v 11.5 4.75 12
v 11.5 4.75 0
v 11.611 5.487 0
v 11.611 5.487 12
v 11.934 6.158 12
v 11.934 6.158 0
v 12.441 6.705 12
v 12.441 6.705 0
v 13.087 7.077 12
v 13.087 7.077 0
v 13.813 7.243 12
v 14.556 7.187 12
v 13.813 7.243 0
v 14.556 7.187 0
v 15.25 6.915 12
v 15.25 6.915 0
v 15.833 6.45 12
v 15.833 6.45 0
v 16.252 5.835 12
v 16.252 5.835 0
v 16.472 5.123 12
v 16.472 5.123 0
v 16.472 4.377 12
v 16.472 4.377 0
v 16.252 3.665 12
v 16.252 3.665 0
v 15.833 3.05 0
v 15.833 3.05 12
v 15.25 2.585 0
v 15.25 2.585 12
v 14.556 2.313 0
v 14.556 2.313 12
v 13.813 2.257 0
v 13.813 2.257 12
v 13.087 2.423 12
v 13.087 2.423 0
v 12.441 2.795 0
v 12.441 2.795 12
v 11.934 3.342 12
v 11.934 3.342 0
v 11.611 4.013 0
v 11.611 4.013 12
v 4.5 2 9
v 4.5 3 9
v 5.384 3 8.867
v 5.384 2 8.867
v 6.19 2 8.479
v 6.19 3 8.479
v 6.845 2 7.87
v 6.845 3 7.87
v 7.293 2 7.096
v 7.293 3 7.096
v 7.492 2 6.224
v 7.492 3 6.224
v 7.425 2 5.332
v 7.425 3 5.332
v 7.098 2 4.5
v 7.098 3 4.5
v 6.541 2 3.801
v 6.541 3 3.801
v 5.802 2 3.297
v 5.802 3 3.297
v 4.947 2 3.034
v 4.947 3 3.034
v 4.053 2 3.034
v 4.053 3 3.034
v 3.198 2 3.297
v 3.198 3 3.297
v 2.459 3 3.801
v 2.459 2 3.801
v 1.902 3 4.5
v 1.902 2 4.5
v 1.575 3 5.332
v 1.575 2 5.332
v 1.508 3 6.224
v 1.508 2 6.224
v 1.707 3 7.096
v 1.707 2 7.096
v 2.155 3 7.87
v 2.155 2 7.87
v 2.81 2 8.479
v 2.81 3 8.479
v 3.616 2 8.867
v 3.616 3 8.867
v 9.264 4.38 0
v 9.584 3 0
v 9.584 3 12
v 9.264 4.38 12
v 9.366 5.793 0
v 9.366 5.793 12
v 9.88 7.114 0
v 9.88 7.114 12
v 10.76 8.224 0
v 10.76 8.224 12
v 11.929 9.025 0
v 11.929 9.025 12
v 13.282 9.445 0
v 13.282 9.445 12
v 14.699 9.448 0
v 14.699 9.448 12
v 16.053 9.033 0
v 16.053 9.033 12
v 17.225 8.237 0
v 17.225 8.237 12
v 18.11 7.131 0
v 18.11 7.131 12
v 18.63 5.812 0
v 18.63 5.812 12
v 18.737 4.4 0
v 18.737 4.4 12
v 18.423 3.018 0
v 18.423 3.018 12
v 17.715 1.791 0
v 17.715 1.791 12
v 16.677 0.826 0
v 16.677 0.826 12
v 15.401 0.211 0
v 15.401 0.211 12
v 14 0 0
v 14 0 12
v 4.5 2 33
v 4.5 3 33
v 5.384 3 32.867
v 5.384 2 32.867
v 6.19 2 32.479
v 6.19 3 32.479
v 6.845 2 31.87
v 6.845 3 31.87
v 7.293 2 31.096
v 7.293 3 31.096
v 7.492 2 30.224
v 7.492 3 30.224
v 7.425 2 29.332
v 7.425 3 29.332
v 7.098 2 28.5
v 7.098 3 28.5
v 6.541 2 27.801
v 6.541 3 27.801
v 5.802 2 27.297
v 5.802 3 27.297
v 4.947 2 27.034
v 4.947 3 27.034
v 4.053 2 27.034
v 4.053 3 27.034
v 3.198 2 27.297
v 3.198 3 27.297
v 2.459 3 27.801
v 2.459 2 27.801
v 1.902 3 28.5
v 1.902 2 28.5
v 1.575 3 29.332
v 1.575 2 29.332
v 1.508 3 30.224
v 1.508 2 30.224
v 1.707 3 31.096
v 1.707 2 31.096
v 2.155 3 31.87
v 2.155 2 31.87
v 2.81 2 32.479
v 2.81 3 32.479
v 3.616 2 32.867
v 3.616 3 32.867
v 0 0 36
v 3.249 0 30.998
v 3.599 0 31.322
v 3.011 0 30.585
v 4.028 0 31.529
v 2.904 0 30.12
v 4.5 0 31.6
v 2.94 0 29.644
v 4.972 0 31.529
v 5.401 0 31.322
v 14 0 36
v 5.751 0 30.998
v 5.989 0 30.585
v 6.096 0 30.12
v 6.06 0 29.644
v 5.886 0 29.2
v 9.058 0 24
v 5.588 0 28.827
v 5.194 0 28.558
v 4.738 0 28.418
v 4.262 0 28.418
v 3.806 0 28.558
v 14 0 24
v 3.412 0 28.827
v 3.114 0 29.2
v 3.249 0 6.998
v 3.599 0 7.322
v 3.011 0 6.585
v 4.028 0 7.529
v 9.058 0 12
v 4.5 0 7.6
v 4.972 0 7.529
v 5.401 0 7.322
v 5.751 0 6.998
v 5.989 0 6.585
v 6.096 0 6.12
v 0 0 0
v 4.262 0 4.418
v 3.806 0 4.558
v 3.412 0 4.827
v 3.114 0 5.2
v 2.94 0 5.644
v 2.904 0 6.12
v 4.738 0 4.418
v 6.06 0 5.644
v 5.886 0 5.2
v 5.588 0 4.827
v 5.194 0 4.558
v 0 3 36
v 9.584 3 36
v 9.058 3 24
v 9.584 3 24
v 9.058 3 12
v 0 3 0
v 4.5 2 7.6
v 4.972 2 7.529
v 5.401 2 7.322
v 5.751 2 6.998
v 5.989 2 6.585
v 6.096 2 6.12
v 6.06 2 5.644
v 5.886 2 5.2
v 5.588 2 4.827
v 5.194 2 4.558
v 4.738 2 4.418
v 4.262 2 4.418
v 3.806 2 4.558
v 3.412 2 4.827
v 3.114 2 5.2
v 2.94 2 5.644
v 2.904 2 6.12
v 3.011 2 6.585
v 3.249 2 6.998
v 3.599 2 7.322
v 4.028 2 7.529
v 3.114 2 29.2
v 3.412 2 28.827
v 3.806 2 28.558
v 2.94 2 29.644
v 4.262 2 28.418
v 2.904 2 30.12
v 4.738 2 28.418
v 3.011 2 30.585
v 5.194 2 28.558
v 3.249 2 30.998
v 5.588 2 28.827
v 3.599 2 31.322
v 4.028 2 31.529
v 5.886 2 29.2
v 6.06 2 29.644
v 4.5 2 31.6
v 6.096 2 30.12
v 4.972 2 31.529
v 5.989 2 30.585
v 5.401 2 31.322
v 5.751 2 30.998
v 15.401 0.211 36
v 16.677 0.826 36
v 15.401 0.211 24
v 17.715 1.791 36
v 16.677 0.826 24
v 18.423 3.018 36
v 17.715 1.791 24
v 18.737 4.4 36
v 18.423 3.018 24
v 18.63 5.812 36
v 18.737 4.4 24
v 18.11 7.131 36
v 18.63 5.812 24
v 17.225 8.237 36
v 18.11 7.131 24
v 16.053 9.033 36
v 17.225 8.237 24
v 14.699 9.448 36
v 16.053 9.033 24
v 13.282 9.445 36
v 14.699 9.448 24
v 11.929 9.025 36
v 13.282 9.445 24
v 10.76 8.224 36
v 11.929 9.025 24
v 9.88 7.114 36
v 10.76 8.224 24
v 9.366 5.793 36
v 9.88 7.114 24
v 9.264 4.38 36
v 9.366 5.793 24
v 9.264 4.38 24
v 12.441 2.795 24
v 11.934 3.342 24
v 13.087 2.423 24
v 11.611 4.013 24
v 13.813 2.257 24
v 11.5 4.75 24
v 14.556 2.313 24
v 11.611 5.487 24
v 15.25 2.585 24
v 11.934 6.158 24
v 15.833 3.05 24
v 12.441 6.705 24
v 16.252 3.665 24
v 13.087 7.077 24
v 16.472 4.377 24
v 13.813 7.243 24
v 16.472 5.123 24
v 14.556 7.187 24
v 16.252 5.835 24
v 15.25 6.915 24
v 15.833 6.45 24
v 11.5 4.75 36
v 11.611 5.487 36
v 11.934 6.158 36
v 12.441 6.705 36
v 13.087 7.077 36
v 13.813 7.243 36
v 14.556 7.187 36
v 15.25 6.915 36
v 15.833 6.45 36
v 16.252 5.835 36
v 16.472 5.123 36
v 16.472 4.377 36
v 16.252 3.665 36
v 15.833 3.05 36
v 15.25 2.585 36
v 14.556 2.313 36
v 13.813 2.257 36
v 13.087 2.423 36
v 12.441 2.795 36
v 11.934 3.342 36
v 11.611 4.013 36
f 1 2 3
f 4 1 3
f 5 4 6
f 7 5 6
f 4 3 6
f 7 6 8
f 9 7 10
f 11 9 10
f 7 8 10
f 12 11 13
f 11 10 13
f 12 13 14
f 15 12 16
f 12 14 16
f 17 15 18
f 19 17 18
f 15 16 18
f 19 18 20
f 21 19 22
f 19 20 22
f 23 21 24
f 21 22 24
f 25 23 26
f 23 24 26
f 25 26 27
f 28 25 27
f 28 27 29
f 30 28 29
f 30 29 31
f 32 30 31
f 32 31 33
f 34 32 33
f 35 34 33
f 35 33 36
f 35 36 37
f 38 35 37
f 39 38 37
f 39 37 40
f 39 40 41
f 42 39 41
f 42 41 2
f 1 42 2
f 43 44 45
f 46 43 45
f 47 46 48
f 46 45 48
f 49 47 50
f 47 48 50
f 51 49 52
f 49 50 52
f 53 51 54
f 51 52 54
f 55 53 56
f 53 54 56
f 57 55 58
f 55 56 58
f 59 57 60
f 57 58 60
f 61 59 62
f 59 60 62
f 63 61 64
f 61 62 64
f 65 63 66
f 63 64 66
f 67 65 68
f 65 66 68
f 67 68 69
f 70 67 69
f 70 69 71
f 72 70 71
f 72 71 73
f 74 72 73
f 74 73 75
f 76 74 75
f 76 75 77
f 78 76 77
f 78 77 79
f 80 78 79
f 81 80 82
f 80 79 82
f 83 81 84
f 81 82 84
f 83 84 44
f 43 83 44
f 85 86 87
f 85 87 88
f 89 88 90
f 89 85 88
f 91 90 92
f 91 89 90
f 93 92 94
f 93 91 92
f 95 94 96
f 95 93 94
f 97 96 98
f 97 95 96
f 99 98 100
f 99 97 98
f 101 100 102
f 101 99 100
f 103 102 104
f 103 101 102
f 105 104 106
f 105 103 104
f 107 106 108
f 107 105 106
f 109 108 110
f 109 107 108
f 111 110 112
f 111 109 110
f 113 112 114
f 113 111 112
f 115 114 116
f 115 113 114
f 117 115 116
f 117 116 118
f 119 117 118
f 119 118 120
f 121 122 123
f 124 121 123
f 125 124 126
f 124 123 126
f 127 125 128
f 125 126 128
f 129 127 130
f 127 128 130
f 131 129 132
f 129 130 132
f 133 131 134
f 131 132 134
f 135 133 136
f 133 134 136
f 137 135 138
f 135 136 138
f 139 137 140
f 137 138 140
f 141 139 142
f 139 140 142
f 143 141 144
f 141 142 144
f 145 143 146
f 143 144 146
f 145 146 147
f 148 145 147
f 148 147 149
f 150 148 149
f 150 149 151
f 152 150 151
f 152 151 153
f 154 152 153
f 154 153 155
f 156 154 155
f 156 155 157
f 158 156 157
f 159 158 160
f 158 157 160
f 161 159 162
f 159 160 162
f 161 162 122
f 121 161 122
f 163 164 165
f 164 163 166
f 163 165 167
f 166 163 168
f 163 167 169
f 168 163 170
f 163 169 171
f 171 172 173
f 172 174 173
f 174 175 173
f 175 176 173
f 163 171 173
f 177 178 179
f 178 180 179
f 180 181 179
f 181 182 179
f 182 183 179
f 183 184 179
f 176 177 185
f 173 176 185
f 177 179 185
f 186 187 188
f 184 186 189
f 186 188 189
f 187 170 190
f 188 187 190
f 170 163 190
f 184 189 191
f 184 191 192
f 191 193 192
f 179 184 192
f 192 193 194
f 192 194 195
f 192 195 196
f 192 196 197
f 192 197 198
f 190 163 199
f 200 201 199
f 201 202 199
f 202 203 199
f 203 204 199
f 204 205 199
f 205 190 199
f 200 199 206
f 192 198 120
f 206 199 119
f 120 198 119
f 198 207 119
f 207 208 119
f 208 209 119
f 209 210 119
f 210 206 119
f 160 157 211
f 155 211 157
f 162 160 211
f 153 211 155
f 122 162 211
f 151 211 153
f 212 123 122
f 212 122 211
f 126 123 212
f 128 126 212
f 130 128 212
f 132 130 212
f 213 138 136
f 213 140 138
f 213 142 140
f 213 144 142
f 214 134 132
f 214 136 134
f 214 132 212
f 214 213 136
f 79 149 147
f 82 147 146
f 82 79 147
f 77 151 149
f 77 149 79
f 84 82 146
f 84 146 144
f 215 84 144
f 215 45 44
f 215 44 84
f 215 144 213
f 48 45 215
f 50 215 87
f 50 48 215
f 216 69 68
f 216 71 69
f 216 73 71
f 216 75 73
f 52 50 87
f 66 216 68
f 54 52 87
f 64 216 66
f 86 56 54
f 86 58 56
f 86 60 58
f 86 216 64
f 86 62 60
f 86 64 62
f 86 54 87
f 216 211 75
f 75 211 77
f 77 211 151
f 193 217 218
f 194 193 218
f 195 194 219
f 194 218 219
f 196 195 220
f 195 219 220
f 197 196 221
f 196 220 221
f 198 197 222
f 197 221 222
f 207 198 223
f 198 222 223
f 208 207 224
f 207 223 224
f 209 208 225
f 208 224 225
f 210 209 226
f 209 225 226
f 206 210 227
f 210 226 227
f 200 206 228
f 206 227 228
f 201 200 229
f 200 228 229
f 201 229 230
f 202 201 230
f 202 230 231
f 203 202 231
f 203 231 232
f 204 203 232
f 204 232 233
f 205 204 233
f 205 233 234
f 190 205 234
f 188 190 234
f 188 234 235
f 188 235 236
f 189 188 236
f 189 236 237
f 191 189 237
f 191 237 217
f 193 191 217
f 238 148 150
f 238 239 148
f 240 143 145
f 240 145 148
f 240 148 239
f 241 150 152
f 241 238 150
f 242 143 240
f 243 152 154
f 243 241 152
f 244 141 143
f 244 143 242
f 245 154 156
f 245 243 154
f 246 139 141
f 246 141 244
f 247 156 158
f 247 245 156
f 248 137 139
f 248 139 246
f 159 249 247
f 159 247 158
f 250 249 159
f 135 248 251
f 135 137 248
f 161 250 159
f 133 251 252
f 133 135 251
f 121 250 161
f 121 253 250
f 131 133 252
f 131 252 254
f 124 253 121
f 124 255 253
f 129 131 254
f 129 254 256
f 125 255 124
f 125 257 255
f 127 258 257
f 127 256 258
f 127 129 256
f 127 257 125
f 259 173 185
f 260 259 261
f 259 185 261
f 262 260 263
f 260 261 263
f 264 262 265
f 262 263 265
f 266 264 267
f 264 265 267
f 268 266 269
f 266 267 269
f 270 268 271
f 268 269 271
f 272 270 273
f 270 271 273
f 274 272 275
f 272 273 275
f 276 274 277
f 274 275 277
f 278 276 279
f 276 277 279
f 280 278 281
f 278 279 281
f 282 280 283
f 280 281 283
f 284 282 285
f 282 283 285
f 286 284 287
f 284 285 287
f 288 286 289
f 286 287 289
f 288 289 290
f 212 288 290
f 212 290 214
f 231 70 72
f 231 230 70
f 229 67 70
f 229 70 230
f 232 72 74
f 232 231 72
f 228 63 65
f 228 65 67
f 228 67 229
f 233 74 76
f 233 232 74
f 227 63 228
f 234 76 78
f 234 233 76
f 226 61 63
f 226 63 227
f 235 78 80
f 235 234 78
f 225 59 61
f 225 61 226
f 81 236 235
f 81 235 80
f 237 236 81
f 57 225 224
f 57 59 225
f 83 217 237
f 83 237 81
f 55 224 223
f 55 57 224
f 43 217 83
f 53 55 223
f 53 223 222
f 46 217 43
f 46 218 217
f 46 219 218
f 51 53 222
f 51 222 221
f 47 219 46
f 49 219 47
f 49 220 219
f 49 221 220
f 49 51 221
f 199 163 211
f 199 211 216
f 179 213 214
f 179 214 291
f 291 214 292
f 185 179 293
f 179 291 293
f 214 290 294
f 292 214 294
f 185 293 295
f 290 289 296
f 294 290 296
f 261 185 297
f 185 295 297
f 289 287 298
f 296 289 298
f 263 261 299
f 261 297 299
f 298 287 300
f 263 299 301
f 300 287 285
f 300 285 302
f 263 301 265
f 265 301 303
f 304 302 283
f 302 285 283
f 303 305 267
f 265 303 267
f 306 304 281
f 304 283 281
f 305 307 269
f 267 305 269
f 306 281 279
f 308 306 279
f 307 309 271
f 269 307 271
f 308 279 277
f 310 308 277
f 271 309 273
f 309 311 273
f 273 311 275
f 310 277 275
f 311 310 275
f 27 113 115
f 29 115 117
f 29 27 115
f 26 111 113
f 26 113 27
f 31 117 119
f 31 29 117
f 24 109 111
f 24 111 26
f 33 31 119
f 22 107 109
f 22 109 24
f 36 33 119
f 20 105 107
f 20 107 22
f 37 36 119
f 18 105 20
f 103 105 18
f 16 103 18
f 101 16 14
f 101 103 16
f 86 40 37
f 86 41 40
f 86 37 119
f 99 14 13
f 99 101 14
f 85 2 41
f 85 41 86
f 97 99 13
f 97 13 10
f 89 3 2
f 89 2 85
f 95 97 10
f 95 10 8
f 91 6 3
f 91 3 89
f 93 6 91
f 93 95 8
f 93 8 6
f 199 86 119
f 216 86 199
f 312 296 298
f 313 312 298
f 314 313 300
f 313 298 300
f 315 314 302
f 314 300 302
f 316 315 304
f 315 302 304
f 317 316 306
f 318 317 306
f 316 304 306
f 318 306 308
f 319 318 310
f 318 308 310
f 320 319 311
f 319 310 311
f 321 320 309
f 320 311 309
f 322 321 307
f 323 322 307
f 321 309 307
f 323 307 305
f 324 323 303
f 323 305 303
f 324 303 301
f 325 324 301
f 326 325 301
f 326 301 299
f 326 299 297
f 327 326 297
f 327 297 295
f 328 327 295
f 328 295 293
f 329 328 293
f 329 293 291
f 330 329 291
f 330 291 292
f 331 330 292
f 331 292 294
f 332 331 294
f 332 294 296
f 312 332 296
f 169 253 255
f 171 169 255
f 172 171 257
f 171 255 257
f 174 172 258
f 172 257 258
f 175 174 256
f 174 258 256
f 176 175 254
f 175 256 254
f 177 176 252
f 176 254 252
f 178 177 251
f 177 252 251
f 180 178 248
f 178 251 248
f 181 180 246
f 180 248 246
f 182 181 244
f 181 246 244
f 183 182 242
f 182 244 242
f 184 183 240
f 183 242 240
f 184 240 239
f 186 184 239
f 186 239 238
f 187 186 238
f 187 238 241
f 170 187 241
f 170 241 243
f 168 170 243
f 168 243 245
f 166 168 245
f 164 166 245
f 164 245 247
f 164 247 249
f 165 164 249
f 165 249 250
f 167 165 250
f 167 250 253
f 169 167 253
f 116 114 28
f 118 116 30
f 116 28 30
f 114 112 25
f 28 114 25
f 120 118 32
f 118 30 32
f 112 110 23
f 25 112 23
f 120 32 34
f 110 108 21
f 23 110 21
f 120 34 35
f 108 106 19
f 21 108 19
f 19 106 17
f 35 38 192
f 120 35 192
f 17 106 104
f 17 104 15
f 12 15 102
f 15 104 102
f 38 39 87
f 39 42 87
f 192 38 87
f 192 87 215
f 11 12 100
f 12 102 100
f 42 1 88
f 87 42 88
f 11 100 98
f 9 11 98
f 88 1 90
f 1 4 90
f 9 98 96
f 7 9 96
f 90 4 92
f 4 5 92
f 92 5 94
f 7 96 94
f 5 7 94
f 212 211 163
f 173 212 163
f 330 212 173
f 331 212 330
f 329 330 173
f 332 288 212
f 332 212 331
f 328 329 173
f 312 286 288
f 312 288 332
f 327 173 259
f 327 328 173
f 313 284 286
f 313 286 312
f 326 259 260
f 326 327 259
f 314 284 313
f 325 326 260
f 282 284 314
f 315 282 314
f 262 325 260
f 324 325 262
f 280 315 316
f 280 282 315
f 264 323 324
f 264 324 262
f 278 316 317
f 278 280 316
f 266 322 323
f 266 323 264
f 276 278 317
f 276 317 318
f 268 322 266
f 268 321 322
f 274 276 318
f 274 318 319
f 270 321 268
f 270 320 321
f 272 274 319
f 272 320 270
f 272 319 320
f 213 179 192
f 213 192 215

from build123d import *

# Parameters (mm, degrees)
SKETCH_1_W          = 14
SKETCH_1_H          = 36
EXTRUDE_1_DEPTH     = 3
SKETCH_2_R          = 4.75
EXTRUDE_2_DEPTH     = 12
EXTRUDE_START       = -12
SKETCH_3_R          = 4.75
EXTRUDE_3_DEPTH     = 12
SKETCH_4_R          = 2.5
CUT_EXTRUDE_1_DEPTH = 51
SKETCH_5_W          = 8.893722196
SKETCH_5_H          = 10.697157082
CUT_EXTRUDE_2_DEPTH = 12
SKETCH_6_R          = 1.6
CUT_EXTRUDE_3_DEPTH = 10
SKETCH_7_R          = 3
CUT_EXTRUDE_4_DEPTH = 1


with BuildPart() as part:
    # 草图1 → 凸台-拉伸1 (new body)
    with BuildSketch(Plane(origin=(0, 0, 0), x_dir=(1, 0, 0), z_dir=(0, 1, 0))):
        with Locations((7, -18)):
            Rectangle(SKETCH_1_W, SKETCH_1_H)
    extrude(amount=EXTRUDE_1_DEPTH)

    # 草图2 → 凸台-拉伸2 (add)
    with BuildSketch(Plane(origin=(0, 0, 0), x_dir=(-1, 0, 0), z_dir=(0, 0, -1))):
        with Locations((-14, 4.75)):
            Circle(SKETCH_2_R)
    extrude(amount=-EXTRUDE_2_DEPTH)

    # 草图3 → 凸台-拉伸3 (add)
    with BuildSketch(Plane.XY.offset(36).offset(EXTRUDE_START)):
        with Locations((14, 4.75)):
            Circle(SKETCH_3_R)
    extrude(amount=EXTRUDE_3_DEPTH)

    # 草图4 → 切除-拉伸1 (cut)
    with BuildSketch(Plane(origin=(0, 0, 0), x_dir=(-1, 0, 0), z_dir=(0, 0, -1))):
        with Locations((-14, 4.75)):
            Circle(SKETCH_4_R)
    extrude(amount=-CUT_EXTRUDE_1_DEPTH, mode=Mode.SUBTRACT)

    # 草图5 → 切除-拉伸2 (cut)
    with BuildSketch(Plane(origin=(0, 0, 24), x_dir=(-1, 0, 0), z_dir=(0, 0, -1))):
        with Locations((-13.504665101, 2.655560542)):
            Rectangle(SKETCH_5_W, SKETCH_5_H)
    extrude(amount=CUT_EXTRUDE_2_DEPTH, mode=Mode.SUBTRACT)

    # 草图6 → 切除-拉伸3 (cut)
    with BuildSketch(Plane(origin=(0, 3, 0), x_dir=(1, 0, 0), z_dir=(0, 1, 0))):
        with Locations(Location((4.5, -6, 0), (0, 0, 270))):
            Circle(SKETCH_6_R)
        with Locations(Location((4.5, -30, 0), (0, 0, 270))):
            Circle(SKETCH_6_R)
    extrude(amount=-CUT_EXTRUDE_3_DEPTH, mode=Mode.SUBTRACT)

    # 草图7 → 切除-拉伸4 (cut)
    with BuildSketch(Plane(origin=(0, 3, 0), x_dir=(1, 0, 0), z_dir=(0, 1, 0))):
        with Locations(Location((4.5, -6, 0), (0, 0, 270))):
            Circle(SKETCH_7_R)
        with Locations(Location((4.5, -30, 0), (0, 0, 270))):
            Circle(SKETCH_7_R)
    extrude(amount=-CUT_EXTRUDE_4_DEPTH, mode=Mode.SUBTRACT)


solid = part.part
